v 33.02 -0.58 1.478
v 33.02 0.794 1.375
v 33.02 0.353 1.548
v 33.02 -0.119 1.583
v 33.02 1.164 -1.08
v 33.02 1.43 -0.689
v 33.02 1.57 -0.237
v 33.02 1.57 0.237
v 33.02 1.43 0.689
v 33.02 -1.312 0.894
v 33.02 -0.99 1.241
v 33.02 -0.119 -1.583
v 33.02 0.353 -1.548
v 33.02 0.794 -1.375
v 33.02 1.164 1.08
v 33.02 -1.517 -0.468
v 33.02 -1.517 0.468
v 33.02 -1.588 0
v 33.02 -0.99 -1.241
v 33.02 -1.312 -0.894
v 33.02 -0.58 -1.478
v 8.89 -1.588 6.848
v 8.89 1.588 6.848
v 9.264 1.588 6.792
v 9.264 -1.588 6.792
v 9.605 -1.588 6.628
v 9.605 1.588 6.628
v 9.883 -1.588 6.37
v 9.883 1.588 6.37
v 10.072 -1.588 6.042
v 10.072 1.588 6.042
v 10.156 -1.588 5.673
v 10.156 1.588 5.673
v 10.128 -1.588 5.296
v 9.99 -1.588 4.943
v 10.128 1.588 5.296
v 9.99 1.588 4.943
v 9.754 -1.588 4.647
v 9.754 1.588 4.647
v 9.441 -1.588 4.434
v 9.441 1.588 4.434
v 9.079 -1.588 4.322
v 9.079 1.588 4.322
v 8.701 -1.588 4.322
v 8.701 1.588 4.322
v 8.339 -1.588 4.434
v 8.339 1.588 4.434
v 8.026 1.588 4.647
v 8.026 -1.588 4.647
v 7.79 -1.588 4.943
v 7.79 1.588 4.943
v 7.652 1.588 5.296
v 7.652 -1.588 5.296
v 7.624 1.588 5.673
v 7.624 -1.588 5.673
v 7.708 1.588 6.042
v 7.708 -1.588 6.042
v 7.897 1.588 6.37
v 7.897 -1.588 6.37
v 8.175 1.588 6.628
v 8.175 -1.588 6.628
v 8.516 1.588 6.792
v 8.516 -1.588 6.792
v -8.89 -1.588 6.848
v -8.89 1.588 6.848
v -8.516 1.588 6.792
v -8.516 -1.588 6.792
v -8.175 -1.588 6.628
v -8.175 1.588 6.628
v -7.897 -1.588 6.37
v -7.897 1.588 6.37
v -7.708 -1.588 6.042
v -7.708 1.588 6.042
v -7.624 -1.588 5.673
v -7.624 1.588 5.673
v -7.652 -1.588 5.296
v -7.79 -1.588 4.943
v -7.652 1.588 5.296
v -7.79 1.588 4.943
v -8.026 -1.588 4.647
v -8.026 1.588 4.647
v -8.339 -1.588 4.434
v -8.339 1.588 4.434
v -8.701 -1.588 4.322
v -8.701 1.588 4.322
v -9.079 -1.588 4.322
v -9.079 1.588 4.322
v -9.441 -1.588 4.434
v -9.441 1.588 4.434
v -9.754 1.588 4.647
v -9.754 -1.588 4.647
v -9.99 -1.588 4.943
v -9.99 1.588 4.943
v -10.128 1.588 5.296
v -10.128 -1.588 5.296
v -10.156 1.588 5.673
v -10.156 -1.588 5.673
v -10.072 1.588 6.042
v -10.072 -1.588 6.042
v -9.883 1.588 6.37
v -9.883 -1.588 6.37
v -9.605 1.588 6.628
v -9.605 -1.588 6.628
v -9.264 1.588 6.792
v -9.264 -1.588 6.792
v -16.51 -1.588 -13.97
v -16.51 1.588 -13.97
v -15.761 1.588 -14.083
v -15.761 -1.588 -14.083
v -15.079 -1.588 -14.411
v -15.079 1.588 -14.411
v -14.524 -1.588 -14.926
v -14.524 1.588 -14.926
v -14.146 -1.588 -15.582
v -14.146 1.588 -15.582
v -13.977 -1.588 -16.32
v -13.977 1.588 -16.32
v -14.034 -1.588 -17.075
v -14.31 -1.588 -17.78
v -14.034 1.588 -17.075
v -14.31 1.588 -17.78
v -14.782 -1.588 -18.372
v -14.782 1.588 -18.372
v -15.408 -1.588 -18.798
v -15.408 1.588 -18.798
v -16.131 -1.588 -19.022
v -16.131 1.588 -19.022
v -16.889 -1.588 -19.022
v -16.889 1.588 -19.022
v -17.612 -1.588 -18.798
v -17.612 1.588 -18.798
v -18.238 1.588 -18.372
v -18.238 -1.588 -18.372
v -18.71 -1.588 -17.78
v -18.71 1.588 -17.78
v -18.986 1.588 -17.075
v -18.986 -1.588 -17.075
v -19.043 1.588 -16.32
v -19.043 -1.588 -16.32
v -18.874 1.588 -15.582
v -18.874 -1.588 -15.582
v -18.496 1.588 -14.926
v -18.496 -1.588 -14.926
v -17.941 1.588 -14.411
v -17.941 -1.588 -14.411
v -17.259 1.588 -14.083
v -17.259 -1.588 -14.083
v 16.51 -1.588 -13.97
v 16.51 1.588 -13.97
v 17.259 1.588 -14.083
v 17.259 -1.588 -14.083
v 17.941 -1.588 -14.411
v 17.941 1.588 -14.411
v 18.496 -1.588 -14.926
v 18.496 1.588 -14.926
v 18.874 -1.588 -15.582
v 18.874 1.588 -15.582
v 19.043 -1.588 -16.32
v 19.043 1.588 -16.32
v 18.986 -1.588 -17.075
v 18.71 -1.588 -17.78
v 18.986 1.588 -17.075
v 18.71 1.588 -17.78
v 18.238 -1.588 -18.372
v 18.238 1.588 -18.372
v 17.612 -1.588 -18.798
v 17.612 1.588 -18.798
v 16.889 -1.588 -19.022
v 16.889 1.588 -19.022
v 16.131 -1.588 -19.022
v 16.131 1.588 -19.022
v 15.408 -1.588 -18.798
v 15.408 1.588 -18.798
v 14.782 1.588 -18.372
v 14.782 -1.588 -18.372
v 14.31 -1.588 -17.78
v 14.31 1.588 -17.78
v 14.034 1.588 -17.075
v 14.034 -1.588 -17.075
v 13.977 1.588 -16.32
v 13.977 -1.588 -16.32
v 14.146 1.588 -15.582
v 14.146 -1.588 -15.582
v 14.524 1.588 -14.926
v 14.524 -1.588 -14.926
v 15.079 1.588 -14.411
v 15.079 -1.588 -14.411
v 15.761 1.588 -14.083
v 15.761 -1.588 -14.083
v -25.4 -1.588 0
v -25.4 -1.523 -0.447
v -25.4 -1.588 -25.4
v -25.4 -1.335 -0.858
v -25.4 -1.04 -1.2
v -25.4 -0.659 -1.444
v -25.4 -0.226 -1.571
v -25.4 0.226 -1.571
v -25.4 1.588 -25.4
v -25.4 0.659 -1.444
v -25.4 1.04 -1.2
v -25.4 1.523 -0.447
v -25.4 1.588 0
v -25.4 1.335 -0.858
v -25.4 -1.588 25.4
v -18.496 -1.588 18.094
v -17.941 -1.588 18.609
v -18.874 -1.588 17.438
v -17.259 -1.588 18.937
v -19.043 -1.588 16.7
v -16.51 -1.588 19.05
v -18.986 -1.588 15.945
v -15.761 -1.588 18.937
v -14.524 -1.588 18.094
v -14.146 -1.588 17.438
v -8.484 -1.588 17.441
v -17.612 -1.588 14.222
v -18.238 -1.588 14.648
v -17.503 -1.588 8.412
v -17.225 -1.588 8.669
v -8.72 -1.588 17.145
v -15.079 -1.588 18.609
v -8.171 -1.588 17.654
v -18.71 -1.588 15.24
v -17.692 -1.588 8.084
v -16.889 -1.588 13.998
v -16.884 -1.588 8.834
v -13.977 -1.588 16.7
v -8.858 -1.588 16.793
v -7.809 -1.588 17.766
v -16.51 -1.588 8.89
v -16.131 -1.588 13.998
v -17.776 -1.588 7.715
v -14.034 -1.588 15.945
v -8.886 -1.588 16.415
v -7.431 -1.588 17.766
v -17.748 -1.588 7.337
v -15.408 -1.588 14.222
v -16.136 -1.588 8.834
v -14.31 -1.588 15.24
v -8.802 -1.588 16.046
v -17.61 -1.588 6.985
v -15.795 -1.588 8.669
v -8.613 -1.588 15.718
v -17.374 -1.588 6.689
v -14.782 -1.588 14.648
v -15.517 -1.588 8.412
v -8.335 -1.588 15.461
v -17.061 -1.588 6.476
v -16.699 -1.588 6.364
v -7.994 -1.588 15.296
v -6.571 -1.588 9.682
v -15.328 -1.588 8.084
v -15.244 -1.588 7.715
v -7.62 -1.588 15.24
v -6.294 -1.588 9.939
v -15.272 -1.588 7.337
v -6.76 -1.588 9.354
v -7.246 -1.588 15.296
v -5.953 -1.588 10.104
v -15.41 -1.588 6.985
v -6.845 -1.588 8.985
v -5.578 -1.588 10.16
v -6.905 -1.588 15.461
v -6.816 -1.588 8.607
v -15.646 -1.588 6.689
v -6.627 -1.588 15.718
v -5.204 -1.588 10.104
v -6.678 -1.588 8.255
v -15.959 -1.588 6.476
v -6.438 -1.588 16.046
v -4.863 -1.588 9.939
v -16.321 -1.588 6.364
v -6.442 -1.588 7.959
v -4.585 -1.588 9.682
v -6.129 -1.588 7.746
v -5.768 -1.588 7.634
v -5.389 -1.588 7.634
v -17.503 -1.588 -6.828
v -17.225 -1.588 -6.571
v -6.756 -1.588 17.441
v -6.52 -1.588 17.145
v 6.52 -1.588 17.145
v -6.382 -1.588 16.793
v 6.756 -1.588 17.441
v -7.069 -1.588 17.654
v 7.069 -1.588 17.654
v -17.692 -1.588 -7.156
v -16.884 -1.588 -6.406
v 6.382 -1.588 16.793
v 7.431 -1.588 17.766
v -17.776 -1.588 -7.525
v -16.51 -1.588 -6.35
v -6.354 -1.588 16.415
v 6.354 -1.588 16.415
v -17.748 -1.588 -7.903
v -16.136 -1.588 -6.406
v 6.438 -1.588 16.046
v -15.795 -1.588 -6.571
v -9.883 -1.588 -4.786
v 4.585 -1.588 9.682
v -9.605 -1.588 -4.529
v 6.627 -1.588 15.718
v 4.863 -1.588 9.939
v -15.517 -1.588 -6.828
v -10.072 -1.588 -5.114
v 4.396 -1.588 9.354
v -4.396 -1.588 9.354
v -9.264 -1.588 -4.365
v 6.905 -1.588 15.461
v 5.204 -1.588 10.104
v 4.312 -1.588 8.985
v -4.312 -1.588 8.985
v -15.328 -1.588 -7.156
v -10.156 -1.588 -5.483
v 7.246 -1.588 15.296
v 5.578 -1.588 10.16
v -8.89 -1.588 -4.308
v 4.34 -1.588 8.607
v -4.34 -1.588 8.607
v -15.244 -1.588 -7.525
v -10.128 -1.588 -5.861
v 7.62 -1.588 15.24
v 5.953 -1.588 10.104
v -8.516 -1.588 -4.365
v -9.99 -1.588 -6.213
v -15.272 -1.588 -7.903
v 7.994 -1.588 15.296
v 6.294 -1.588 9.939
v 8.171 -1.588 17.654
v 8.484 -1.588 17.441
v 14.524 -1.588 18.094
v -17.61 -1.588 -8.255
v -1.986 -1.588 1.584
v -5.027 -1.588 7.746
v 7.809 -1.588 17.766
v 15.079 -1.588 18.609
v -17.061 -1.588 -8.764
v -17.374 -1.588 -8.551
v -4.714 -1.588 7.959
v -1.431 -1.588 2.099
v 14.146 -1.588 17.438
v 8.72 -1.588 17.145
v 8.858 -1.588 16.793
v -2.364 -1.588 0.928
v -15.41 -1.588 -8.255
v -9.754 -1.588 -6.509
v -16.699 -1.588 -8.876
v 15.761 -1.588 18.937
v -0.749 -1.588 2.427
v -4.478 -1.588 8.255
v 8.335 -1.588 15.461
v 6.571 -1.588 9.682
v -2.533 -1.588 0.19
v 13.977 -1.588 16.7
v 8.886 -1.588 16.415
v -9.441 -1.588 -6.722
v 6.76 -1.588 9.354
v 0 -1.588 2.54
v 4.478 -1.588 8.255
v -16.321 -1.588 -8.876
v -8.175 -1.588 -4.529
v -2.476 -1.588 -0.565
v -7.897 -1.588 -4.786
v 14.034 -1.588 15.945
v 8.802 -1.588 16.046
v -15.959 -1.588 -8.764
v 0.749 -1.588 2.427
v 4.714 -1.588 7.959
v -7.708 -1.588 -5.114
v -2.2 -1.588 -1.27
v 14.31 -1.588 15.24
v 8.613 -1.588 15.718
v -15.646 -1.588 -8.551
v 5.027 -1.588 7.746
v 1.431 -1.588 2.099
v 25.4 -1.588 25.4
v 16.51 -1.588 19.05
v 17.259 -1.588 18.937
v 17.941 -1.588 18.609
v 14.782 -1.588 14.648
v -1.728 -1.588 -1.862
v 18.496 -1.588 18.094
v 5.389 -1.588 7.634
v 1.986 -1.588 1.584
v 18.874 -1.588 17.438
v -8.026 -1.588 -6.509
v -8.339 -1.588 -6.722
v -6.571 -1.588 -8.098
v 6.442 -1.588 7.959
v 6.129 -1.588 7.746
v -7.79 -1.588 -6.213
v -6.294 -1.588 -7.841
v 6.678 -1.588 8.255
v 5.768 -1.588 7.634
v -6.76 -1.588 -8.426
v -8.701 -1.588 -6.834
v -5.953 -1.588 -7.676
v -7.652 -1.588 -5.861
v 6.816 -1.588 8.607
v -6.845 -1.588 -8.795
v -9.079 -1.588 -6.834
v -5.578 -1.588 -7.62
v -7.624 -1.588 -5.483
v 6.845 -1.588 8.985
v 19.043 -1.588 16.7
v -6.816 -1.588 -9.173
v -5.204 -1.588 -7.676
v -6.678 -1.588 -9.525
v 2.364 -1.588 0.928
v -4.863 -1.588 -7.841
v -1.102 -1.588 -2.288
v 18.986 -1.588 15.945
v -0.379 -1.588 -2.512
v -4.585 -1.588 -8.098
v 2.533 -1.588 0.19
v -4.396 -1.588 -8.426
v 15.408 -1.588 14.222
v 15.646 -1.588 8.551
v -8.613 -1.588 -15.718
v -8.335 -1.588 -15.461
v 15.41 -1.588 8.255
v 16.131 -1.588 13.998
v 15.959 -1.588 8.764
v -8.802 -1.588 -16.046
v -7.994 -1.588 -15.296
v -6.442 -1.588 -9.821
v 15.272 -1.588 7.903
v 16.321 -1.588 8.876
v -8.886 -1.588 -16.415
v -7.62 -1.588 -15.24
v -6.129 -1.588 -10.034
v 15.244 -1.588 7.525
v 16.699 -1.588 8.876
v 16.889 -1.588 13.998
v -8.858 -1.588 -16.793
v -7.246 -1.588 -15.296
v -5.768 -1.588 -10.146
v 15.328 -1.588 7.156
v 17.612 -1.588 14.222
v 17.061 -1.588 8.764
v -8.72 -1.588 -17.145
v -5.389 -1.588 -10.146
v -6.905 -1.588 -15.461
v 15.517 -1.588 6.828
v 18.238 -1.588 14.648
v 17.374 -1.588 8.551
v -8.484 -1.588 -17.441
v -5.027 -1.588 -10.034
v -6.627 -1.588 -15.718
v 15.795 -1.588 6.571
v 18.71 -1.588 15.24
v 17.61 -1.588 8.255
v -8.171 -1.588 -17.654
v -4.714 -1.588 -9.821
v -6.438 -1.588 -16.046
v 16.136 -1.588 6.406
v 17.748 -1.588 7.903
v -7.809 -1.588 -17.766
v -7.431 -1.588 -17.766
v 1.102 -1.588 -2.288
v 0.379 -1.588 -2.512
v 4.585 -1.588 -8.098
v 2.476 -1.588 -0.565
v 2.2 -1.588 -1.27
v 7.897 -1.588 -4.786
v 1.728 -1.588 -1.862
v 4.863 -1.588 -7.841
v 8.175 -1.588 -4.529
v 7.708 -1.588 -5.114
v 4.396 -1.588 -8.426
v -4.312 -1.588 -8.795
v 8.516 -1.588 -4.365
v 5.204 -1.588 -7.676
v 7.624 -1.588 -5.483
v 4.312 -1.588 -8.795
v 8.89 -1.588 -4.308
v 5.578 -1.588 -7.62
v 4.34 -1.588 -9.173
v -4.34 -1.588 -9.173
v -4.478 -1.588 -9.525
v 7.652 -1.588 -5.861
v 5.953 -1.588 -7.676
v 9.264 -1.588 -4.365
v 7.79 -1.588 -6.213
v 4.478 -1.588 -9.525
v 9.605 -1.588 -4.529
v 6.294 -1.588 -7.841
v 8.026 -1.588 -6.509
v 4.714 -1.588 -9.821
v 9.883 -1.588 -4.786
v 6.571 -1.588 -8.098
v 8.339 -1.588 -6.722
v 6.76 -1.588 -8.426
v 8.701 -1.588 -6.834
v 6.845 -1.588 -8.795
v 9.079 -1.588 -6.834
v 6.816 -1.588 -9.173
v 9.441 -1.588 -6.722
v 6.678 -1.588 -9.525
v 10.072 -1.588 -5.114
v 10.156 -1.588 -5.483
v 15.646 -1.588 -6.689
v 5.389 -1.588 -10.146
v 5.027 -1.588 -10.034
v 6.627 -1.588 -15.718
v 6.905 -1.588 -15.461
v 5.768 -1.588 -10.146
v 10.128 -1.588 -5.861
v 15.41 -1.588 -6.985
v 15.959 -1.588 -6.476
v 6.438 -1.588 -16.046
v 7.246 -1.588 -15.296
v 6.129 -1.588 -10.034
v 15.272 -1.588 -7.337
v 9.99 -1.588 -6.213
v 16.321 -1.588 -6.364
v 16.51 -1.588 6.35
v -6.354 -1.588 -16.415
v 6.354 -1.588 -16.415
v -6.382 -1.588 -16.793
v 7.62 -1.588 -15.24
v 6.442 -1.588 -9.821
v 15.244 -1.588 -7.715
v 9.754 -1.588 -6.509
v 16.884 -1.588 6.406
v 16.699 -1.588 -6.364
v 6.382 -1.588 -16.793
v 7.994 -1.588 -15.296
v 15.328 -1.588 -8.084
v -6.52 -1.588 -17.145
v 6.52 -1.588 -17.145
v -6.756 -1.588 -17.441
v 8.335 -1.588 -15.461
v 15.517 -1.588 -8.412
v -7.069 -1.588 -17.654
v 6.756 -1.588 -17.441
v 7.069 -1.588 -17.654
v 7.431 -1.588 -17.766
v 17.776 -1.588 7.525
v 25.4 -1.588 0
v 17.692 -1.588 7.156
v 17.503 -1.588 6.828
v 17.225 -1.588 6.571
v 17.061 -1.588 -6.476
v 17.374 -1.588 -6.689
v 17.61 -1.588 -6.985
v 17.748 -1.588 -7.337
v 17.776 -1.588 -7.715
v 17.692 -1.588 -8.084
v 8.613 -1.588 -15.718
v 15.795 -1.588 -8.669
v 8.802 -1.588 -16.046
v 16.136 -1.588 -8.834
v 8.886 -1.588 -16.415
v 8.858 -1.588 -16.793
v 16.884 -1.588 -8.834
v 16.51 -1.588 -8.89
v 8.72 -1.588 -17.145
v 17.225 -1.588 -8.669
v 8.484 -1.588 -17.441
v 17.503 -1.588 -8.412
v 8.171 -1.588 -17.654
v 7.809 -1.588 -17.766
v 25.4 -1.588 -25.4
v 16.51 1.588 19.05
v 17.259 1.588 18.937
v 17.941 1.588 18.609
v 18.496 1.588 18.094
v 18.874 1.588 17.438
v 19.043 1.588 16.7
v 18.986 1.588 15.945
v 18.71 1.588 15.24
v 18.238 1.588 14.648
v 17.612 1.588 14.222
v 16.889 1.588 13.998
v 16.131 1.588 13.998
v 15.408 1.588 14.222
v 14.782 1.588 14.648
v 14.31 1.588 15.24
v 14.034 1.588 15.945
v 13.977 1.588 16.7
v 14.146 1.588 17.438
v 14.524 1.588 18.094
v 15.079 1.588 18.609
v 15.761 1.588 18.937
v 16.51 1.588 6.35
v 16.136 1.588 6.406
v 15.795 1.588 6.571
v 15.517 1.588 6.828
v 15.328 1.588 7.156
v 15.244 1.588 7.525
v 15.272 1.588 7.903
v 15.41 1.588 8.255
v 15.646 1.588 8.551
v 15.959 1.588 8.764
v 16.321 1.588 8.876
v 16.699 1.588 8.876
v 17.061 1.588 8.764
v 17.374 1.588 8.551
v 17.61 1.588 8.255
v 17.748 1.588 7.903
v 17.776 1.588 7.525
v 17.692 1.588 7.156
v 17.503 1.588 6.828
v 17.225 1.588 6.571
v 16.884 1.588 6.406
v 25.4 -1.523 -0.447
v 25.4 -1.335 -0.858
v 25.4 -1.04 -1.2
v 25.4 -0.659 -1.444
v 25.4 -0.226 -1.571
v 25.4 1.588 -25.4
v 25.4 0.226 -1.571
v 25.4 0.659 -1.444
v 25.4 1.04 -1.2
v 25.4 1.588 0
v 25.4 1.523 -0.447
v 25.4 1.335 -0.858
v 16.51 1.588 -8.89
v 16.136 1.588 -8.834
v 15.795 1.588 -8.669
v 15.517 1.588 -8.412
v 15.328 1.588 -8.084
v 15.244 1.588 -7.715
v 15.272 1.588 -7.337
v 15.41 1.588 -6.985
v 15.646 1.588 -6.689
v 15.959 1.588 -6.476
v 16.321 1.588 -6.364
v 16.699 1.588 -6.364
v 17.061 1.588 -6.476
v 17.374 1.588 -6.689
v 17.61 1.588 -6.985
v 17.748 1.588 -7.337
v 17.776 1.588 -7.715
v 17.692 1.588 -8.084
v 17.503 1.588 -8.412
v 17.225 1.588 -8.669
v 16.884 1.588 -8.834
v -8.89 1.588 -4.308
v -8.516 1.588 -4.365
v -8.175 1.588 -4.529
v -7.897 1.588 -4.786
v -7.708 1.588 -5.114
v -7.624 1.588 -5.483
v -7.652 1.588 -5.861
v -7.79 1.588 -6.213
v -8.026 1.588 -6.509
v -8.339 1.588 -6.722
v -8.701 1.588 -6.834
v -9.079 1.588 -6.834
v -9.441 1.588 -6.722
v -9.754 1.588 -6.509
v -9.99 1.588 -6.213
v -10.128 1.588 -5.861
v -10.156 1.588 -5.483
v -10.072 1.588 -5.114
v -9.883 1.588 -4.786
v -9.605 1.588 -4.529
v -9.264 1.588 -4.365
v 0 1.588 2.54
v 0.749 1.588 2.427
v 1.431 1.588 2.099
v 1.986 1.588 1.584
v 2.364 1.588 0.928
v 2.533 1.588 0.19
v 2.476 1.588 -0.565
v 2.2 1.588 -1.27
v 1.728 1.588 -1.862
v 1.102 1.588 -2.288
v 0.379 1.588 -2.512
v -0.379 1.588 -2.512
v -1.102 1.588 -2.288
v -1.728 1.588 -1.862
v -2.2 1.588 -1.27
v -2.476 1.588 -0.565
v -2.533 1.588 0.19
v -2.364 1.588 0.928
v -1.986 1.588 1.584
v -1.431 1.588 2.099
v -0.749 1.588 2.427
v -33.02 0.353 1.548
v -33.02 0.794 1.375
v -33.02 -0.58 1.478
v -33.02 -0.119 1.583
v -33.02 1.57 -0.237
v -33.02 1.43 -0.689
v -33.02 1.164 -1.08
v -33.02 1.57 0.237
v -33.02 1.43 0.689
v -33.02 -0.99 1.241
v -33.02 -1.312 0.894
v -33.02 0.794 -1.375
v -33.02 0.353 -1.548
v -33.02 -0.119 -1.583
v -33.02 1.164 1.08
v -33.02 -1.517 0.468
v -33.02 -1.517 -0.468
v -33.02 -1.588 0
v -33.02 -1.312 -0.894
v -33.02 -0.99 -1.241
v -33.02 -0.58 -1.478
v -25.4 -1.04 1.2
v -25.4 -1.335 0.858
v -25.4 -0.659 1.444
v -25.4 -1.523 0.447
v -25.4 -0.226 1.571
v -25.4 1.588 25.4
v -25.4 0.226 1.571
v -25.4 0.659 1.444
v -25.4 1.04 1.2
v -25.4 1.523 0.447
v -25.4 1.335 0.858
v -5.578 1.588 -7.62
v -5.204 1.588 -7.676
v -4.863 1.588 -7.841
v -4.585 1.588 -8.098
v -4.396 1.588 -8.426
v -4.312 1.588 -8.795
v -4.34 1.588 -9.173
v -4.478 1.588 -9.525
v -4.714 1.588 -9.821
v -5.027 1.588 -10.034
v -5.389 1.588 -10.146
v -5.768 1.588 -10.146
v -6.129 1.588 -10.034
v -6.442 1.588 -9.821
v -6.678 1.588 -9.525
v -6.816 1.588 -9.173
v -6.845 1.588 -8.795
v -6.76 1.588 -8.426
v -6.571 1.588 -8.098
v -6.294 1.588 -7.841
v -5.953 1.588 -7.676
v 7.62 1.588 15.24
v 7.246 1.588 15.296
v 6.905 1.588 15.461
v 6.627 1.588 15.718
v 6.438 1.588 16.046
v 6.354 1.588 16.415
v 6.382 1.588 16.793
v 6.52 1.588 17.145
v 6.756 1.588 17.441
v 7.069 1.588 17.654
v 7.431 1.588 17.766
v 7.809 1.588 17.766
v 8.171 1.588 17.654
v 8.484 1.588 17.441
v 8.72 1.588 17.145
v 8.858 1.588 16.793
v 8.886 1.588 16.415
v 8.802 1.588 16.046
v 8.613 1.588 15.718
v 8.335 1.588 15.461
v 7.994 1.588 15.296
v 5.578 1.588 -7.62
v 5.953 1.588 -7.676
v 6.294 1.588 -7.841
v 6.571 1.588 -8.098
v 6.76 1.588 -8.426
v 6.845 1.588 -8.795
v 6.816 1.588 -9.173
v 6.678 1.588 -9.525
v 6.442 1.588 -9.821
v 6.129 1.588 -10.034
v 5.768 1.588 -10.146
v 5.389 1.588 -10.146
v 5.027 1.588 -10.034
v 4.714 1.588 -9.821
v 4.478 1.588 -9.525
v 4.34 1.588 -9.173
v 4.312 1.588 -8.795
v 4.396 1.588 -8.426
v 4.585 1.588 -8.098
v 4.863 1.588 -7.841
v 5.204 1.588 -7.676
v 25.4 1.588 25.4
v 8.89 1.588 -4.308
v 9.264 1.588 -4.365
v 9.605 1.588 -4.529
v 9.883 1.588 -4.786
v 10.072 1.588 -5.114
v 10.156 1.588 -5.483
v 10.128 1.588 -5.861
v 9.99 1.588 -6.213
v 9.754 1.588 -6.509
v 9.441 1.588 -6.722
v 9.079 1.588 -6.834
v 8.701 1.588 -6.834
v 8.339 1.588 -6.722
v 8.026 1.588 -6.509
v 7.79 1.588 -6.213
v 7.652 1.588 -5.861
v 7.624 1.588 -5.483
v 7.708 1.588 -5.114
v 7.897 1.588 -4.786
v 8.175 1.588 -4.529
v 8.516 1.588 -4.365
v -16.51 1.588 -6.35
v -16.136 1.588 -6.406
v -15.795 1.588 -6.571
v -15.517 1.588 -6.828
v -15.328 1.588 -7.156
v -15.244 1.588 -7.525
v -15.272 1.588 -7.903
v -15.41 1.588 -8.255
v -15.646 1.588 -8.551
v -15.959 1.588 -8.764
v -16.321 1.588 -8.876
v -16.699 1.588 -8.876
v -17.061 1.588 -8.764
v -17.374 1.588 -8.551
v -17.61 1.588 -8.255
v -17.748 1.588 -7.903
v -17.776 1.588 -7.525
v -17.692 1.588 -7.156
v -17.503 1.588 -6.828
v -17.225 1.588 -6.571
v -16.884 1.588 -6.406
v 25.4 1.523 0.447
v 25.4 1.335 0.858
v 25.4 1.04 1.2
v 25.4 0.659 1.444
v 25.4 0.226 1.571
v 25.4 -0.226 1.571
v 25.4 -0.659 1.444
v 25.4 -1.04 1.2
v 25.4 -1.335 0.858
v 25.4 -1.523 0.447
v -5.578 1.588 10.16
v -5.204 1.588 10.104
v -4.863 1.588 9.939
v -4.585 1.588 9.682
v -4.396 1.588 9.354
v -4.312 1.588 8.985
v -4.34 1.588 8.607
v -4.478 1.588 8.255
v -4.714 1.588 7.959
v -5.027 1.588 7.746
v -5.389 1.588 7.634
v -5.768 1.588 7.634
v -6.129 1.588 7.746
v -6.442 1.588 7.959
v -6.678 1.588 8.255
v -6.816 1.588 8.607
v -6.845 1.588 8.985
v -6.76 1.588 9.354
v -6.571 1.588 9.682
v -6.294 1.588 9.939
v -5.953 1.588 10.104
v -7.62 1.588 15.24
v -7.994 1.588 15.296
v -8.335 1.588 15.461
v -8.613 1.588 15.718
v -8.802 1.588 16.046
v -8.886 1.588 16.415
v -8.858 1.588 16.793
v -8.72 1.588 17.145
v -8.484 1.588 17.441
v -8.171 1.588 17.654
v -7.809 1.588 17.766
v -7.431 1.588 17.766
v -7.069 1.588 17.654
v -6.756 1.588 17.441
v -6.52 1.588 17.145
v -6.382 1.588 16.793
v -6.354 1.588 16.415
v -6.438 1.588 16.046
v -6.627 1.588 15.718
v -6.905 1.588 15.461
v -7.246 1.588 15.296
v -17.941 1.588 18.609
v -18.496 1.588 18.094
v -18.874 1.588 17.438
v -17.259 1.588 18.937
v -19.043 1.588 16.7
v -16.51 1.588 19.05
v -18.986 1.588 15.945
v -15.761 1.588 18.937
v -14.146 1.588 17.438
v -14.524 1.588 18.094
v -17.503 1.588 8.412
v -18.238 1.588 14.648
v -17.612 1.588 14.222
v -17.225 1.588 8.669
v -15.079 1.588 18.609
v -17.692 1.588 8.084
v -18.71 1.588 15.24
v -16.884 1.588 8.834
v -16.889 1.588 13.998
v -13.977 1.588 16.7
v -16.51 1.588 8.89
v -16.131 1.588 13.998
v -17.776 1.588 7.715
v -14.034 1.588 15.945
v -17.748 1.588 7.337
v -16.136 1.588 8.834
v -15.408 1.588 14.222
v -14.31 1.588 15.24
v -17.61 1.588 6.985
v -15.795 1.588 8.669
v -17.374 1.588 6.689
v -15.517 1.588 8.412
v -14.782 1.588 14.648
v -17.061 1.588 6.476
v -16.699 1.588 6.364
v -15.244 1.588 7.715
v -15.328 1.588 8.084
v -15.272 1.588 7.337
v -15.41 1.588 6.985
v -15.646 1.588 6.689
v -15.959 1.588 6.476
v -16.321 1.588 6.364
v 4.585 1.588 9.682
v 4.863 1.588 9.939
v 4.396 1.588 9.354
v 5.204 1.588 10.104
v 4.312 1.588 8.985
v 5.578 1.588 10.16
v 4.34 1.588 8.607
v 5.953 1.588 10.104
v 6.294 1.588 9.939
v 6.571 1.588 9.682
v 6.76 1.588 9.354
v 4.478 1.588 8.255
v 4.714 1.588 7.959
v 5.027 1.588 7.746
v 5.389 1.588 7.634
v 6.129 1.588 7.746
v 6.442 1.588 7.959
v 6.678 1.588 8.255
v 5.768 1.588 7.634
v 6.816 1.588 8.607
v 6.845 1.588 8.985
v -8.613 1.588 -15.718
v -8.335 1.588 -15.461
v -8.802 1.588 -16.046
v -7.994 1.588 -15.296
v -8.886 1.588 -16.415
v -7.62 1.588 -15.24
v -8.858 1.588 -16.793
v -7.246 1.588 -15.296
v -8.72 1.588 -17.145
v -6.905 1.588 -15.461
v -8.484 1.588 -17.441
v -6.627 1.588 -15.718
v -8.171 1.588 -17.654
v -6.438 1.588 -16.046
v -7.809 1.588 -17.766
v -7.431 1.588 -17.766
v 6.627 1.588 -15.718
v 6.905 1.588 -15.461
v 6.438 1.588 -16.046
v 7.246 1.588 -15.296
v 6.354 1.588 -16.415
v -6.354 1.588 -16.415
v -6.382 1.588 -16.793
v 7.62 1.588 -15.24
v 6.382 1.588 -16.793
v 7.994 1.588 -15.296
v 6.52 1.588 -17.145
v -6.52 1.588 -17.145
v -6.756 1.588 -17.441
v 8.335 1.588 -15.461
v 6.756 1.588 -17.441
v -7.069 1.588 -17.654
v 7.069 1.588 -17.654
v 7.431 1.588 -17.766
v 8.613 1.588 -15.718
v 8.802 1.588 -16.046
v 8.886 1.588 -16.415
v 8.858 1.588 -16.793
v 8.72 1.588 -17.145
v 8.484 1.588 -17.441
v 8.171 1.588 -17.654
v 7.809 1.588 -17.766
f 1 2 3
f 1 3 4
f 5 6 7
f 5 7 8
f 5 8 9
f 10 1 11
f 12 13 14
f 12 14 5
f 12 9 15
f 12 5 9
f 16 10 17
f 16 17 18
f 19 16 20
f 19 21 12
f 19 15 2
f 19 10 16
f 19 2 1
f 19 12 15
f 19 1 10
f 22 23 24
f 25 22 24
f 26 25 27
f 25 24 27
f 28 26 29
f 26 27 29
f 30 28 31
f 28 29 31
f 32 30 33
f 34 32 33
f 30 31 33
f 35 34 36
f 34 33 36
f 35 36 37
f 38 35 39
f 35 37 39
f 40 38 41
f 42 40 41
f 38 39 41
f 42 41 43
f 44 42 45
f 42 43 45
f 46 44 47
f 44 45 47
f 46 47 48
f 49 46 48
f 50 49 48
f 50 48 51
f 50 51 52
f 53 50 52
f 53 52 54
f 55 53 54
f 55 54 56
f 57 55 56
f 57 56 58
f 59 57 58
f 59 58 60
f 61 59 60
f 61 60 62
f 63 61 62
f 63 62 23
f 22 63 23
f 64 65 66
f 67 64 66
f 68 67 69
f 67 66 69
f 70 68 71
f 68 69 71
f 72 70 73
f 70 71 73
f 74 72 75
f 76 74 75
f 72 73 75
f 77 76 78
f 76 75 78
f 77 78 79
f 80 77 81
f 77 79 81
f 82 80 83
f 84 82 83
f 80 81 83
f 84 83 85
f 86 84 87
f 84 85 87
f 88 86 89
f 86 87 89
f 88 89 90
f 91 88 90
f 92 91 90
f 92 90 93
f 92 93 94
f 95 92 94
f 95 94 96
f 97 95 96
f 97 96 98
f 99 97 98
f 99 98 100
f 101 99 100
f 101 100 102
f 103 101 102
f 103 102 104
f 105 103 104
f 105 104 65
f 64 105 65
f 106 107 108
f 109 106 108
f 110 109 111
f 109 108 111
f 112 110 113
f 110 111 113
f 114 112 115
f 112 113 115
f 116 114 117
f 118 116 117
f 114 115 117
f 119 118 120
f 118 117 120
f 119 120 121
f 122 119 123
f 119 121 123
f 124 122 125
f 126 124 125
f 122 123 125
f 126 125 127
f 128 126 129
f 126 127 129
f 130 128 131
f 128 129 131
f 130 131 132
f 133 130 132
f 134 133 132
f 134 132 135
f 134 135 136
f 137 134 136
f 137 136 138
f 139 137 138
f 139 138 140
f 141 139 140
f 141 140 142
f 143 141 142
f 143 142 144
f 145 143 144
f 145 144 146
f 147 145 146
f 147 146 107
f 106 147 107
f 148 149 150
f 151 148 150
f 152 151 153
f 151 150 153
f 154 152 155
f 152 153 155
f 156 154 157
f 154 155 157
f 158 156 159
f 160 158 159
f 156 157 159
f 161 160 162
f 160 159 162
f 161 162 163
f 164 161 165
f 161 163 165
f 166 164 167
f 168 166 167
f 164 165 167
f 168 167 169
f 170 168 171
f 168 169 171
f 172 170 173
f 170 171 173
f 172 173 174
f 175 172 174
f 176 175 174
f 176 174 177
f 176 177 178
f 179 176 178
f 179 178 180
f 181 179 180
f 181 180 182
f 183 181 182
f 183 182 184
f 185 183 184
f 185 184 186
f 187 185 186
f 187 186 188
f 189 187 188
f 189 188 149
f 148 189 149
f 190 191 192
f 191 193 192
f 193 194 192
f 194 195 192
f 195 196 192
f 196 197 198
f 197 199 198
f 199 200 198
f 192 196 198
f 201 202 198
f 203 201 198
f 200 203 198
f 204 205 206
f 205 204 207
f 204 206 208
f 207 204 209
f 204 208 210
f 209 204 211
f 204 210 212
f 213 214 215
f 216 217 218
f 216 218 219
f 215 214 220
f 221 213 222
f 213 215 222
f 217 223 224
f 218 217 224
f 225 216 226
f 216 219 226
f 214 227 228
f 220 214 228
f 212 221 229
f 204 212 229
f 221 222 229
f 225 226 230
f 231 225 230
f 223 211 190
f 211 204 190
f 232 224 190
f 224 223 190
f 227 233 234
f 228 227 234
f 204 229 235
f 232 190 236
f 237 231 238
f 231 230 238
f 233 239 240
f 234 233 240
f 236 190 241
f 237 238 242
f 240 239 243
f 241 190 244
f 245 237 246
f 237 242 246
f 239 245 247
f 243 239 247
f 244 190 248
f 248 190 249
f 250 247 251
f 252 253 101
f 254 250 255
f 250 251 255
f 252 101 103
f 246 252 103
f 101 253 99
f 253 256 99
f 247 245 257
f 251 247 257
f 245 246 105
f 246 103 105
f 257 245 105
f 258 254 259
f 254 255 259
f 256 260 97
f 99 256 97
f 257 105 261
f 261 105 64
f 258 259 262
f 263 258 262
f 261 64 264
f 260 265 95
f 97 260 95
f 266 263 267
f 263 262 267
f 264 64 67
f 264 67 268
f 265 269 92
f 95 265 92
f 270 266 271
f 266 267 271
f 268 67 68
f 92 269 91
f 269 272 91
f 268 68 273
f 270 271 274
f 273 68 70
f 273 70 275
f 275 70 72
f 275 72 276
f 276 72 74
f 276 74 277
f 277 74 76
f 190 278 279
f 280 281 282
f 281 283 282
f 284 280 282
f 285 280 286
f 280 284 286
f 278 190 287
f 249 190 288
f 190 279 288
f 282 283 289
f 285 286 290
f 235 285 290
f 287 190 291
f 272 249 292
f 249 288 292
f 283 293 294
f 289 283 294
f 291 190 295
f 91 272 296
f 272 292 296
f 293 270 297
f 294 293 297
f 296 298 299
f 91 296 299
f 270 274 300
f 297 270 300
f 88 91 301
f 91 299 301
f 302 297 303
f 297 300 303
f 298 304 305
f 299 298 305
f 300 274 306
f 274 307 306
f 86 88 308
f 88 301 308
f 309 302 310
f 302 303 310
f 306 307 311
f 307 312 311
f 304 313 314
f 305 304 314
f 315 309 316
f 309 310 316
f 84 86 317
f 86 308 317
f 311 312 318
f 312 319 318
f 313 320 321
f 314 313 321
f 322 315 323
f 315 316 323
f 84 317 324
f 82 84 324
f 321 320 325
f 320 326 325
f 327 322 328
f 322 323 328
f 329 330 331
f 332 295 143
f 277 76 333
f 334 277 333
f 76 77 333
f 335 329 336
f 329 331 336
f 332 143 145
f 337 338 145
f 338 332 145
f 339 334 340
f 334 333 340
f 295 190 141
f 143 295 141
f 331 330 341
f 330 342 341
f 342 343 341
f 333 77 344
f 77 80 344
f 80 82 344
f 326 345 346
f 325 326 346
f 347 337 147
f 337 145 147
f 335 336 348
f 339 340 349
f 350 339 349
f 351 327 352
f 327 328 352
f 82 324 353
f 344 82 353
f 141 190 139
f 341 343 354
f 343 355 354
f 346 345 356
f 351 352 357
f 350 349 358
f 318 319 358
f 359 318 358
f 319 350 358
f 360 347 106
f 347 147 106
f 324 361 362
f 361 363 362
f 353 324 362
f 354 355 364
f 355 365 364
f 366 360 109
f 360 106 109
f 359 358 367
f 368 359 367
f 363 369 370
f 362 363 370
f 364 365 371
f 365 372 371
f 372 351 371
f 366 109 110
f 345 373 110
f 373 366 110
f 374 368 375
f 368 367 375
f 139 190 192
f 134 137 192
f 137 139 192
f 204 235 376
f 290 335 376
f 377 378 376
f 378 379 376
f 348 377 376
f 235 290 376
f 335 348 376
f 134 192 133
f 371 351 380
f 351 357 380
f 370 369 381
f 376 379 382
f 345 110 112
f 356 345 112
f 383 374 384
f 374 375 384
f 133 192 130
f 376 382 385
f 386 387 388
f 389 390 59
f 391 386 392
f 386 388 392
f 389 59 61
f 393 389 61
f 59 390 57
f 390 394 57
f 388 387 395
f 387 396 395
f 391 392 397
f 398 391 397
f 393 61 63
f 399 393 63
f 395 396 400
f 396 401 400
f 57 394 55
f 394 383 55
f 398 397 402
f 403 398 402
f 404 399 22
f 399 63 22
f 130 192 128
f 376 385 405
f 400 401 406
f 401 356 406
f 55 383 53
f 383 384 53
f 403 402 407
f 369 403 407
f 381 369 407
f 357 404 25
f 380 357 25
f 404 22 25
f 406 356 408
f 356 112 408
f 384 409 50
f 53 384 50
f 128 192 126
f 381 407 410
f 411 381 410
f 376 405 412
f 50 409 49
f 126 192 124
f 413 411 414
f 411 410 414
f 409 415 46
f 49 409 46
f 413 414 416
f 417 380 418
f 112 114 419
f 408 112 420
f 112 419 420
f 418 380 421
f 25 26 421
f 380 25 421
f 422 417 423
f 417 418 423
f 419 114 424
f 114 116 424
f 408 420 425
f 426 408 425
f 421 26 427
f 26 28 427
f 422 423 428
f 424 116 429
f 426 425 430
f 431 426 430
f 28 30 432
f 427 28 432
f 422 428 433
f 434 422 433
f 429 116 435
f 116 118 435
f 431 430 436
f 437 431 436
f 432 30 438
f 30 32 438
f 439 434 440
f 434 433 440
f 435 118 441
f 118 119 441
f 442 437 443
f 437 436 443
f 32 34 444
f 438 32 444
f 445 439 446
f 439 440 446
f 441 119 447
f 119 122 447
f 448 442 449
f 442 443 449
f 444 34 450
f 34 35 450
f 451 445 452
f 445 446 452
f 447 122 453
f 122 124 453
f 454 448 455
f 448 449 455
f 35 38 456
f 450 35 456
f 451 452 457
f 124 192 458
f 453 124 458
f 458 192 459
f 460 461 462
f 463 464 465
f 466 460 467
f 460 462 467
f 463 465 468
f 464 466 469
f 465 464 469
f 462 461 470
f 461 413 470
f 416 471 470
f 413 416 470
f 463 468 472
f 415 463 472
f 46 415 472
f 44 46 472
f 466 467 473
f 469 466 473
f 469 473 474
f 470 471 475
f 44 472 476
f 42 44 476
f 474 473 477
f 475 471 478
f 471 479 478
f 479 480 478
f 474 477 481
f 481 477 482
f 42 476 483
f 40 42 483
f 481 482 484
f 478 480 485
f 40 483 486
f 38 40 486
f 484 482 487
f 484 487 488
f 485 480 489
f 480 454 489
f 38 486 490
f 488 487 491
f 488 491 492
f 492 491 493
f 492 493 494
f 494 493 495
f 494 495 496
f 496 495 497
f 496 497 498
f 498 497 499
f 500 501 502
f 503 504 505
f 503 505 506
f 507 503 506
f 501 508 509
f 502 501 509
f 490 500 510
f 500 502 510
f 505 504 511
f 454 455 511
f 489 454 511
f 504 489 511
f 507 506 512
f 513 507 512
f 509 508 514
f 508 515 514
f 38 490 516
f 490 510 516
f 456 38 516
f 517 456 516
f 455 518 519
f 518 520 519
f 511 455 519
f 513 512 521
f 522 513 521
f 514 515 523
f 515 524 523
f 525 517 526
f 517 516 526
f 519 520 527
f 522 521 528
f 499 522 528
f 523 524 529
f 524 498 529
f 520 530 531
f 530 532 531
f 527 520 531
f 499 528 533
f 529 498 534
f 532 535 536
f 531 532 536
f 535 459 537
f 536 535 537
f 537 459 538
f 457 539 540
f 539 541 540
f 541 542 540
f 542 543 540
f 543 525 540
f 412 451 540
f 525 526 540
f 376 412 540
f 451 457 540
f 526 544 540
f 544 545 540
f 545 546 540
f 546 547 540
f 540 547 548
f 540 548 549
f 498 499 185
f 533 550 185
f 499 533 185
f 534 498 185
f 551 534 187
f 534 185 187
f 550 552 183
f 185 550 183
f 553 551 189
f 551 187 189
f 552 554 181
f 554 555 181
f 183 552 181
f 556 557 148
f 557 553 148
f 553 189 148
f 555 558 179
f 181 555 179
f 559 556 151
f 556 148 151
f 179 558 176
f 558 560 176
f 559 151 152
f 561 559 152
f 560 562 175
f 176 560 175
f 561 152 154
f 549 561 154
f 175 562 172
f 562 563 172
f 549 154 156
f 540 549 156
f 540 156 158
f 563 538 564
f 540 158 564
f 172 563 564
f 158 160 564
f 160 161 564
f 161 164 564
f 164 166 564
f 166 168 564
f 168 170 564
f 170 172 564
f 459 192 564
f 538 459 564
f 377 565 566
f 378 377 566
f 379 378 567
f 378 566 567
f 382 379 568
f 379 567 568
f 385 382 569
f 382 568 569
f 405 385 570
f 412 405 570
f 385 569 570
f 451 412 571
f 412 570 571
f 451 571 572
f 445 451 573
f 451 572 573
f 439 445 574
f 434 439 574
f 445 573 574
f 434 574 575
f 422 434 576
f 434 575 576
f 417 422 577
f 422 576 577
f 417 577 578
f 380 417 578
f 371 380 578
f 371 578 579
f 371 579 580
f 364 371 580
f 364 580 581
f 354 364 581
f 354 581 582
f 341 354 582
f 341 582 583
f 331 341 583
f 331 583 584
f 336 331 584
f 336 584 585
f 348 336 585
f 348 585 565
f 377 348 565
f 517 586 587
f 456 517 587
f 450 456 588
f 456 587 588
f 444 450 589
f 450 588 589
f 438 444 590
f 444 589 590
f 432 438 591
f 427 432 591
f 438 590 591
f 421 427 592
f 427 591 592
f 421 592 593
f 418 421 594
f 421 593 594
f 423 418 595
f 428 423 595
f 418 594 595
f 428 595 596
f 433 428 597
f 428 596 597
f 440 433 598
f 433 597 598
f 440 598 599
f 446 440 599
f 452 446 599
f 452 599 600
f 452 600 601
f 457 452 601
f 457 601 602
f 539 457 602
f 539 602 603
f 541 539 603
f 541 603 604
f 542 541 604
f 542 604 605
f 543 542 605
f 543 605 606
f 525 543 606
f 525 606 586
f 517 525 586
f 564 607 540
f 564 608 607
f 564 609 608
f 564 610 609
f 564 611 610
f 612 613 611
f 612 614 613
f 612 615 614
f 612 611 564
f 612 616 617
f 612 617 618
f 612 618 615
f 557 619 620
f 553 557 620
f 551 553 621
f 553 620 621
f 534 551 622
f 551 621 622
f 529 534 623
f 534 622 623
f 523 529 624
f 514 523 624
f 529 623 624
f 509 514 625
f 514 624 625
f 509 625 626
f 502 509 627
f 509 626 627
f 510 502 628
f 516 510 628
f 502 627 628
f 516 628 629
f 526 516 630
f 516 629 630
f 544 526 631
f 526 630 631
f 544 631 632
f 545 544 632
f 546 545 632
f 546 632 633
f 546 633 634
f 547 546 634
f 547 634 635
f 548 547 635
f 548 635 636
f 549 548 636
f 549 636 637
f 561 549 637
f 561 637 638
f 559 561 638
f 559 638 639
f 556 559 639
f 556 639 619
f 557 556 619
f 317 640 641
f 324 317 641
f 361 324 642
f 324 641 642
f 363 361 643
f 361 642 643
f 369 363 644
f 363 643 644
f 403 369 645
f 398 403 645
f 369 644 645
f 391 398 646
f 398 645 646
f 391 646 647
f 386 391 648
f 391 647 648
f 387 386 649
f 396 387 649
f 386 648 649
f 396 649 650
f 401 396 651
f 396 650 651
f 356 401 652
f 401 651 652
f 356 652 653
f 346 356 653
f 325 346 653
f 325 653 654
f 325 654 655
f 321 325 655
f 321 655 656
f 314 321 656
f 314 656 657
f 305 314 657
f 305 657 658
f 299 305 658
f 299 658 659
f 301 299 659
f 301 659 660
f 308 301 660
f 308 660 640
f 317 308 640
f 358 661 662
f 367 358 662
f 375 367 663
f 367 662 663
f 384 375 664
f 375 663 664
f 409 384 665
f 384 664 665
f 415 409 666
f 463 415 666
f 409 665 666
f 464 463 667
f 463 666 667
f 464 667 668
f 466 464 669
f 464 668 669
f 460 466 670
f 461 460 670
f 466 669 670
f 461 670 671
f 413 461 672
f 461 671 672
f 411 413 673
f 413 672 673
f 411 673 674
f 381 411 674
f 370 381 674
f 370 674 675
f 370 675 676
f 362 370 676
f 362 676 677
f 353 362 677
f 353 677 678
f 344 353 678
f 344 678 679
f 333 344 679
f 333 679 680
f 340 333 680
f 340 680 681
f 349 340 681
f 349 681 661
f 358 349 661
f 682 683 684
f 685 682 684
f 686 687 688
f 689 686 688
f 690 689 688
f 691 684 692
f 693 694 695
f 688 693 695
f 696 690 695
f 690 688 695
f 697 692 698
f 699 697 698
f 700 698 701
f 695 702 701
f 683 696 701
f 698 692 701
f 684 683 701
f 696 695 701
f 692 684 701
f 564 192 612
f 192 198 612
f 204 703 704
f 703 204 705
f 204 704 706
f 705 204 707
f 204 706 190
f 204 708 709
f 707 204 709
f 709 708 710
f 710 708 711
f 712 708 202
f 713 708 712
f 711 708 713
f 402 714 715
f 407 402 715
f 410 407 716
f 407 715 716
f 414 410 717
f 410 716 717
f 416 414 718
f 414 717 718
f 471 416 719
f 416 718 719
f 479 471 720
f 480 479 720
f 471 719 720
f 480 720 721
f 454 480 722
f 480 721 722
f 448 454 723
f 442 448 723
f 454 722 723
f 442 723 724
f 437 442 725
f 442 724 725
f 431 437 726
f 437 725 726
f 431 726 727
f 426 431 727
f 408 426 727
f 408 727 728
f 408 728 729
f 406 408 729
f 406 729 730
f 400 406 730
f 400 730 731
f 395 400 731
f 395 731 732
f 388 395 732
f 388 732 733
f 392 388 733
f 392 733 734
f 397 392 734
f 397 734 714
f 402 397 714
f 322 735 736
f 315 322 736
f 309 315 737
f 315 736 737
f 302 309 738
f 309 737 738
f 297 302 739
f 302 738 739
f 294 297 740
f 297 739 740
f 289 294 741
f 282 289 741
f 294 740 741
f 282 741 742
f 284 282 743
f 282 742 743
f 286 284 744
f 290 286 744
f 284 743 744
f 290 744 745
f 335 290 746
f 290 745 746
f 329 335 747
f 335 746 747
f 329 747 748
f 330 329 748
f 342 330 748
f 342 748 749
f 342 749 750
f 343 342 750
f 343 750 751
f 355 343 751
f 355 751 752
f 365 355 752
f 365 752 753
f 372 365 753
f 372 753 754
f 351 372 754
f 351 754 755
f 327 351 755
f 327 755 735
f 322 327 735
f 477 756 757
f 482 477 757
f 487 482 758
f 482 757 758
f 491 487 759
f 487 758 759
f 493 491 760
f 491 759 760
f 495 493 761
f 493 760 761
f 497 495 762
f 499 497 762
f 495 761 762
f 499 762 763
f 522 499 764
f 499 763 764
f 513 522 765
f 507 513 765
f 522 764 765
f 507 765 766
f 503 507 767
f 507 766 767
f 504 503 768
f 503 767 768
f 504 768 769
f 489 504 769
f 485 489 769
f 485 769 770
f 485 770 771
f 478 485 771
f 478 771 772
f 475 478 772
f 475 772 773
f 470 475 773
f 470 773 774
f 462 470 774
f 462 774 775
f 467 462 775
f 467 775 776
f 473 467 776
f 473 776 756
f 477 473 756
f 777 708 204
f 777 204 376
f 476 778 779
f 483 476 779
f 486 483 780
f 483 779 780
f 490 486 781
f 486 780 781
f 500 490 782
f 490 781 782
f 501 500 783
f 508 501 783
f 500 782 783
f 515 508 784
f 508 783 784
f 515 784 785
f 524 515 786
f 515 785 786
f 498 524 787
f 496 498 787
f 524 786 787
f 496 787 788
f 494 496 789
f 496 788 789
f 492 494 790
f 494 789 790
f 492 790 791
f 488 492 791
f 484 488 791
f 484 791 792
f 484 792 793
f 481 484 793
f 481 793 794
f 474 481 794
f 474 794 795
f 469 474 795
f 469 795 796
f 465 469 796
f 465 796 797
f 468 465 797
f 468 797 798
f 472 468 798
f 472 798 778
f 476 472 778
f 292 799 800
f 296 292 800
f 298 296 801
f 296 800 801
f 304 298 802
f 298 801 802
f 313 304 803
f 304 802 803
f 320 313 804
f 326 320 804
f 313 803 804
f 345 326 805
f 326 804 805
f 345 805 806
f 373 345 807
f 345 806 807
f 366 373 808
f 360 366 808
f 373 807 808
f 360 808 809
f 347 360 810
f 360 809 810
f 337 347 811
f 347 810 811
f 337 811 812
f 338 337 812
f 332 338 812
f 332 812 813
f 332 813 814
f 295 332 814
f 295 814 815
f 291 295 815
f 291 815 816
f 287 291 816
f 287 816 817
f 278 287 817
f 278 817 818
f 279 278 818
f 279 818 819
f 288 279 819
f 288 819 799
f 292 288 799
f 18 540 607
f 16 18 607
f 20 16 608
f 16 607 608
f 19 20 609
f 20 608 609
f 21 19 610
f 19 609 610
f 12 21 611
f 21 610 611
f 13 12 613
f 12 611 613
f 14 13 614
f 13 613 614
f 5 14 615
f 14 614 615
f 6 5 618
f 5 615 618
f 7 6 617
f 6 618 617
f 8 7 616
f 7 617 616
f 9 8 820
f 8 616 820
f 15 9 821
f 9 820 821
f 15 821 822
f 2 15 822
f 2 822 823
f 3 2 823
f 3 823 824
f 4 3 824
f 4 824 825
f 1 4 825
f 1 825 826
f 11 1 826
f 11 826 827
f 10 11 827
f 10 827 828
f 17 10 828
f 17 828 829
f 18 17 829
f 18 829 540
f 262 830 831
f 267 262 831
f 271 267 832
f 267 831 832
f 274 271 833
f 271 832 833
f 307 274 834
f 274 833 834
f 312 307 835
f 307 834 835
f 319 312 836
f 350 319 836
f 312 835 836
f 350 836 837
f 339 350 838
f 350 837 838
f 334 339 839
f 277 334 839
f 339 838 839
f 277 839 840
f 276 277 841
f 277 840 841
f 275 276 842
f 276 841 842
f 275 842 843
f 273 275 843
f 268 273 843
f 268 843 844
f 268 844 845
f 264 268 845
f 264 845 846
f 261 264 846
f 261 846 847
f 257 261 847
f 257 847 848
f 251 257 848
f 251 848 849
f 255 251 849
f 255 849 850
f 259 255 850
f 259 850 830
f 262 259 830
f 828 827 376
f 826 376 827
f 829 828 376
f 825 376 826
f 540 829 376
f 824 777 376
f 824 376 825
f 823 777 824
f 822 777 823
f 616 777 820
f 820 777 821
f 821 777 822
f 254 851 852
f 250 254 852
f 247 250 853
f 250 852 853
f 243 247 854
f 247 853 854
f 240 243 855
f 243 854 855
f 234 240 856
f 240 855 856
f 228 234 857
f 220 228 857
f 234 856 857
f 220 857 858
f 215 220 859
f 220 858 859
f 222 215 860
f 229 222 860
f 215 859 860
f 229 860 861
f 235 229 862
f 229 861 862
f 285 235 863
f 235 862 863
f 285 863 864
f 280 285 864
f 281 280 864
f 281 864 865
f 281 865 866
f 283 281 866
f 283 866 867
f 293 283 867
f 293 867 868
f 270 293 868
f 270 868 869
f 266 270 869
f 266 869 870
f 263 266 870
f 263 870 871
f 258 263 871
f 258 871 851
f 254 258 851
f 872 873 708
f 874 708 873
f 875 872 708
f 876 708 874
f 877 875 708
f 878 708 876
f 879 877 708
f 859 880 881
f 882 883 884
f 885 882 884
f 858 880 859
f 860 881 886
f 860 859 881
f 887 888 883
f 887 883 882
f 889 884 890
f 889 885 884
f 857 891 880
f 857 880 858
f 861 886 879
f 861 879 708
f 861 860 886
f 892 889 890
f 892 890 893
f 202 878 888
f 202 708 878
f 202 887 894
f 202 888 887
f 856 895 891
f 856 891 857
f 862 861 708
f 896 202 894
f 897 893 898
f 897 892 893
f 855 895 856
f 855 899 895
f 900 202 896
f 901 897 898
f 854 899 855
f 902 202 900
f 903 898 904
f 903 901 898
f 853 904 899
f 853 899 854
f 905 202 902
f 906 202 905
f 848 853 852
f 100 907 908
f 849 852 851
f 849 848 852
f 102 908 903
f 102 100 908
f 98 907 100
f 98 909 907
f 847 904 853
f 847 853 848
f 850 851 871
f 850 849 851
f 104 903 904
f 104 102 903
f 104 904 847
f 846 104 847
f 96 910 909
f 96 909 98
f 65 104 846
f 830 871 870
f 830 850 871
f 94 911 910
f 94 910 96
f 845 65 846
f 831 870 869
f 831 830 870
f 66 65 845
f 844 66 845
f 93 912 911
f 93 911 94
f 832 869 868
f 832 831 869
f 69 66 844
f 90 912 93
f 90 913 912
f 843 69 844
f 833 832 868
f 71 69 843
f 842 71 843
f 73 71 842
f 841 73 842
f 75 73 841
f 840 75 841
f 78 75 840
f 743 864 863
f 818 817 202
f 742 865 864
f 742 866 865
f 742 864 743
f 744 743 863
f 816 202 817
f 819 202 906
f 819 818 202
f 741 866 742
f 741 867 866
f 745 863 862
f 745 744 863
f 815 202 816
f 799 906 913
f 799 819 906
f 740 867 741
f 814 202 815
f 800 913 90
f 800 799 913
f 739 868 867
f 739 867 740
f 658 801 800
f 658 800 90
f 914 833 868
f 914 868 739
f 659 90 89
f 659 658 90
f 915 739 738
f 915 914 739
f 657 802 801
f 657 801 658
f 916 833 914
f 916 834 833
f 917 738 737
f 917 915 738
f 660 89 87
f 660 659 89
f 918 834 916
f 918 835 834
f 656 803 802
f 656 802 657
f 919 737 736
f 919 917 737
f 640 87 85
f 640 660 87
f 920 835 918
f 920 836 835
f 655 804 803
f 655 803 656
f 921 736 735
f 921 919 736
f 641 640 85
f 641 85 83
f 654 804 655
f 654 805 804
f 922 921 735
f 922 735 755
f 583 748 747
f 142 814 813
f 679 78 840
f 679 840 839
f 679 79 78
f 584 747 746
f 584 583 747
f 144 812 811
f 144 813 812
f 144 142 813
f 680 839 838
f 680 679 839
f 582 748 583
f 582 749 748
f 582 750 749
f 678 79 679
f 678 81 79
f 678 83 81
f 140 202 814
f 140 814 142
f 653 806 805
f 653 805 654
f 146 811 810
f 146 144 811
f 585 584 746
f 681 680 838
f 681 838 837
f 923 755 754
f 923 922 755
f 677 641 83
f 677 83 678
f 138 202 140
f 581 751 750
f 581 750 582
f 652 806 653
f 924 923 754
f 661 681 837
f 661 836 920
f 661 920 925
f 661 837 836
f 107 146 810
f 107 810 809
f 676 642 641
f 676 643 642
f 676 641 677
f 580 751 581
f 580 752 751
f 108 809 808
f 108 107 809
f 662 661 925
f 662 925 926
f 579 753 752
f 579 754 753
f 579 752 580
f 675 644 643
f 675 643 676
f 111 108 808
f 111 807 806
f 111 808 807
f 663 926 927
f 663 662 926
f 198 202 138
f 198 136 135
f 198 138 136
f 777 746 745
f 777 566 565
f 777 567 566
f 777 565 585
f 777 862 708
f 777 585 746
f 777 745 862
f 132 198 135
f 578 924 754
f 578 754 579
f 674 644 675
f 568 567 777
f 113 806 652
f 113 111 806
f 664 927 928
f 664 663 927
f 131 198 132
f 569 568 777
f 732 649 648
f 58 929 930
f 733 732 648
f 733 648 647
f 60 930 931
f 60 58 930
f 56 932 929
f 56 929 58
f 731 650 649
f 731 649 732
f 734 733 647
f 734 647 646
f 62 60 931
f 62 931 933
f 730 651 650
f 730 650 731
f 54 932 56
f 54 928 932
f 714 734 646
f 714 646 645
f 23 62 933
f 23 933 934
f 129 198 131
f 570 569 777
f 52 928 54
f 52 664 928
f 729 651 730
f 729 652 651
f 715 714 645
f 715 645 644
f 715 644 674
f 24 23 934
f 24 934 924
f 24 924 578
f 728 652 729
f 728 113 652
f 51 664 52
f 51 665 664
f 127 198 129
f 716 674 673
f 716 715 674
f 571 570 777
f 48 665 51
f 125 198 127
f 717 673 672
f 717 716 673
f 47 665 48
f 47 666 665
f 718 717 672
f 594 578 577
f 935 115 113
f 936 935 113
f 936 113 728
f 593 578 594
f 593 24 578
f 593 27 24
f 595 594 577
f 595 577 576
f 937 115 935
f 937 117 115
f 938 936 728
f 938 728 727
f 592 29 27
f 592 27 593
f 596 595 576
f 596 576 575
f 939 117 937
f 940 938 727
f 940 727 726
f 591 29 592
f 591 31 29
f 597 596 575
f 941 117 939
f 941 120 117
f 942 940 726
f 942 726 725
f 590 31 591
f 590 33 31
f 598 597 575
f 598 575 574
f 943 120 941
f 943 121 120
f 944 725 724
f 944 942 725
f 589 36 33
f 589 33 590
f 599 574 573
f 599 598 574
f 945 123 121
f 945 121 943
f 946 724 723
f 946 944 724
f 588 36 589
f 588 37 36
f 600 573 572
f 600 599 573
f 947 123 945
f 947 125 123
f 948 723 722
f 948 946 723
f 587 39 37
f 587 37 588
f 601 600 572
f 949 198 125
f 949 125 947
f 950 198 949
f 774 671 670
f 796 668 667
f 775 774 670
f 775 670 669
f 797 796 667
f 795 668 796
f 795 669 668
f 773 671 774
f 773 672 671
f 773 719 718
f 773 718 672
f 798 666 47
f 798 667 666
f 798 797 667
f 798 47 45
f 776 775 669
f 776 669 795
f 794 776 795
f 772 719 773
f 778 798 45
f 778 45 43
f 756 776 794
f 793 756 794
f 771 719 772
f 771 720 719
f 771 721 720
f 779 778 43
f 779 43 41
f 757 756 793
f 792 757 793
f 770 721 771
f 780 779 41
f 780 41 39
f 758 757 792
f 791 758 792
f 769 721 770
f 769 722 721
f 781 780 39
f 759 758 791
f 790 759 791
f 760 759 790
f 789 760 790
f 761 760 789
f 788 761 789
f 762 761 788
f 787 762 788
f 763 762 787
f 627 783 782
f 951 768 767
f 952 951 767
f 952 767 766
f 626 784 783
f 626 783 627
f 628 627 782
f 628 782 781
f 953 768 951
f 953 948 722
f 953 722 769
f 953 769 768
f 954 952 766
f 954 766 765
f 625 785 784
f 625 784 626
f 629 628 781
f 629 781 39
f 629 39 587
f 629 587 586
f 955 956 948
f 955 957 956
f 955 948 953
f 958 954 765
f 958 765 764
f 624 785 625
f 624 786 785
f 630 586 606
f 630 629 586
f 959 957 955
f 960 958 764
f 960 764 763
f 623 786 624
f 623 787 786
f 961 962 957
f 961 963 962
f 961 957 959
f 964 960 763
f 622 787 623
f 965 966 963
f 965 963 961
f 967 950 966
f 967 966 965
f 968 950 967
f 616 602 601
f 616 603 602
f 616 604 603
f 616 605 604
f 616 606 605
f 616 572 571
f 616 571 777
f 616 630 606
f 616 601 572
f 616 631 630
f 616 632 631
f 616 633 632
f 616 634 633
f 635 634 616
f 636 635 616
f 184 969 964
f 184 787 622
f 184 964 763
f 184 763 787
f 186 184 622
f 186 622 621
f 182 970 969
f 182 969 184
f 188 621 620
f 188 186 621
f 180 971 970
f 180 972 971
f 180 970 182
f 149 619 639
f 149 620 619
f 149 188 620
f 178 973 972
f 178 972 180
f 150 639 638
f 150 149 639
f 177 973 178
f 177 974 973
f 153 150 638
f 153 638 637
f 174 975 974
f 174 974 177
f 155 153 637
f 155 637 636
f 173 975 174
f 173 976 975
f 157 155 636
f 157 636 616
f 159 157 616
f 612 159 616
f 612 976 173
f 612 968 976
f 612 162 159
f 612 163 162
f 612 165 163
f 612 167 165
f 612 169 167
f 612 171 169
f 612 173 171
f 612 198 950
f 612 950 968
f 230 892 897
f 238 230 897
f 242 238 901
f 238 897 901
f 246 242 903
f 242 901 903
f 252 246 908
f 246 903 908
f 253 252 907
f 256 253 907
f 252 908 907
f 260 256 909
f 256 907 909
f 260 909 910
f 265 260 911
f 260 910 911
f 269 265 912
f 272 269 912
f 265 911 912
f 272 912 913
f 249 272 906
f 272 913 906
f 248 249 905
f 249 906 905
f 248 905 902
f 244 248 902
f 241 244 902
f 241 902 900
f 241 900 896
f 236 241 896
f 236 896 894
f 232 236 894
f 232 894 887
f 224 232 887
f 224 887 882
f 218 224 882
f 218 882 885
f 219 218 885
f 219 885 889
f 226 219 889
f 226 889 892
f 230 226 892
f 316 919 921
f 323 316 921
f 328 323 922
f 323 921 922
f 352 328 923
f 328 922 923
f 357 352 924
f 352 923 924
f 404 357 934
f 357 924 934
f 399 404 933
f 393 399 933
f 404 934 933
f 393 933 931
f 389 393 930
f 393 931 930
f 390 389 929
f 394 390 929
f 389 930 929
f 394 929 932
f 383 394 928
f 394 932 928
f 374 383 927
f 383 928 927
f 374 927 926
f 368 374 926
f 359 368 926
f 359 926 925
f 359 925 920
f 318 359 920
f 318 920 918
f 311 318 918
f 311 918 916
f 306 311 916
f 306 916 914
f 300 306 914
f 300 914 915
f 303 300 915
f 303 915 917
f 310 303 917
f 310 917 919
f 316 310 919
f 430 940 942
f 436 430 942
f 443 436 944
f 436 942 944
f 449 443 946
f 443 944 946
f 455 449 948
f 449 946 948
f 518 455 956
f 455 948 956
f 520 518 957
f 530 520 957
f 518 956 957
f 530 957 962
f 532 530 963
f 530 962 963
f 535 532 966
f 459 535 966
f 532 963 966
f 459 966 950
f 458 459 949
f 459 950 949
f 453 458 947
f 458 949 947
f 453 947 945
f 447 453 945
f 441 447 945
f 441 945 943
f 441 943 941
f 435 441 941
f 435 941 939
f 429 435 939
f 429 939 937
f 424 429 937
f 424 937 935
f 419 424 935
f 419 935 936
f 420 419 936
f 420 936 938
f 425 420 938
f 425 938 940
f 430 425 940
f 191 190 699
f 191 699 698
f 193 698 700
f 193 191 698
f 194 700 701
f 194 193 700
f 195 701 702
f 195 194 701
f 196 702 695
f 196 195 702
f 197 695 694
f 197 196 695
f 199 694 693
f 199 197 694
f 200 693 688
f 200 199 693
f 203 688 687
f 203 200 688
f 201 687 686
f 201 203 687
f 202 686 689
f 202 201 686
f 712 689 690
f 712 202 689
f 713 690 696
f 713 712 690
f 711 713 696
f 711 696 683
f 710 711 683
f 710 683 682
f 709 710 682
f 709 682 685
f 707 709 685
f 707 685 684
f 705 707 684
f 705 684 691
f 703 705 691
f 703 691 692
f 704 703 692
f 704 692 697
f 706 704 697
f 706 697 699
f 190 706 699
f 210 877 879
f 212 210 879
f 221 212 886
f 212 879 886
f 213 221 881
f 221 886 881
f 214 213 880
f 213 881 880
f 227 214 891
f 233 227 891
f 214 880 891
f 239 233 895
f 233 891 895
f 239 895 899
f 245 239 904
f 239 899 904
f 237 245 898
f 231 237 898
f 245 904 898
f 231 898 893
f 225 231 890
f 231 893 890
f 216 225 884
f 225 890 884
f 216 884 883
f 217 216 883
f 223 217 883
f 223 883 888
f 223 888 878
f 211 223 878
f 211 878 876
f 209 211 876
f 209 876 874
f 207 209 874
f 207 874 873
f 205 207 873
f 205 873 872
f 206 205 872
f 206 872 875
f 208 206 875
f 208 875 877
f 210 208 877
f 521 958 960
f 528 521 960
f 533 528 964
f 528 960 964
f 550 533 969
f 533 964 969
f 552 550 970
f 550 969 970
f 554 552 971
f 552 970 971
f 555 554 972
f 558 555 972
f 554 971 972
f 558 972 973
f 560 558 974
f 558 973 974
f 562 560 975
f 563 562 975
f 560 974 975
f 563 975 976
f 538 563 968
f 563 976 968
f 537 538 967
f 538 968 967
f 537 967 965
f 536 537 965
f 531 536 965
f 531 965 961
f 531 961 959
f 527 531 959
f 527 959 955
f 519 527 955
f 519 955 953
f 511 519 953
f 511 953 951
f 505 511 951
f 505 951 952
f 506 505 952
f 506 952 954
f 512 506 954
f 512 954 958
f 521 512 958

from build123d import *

# Parameters (mm, degrees)
SKETCH1_W           = 50.8
SKETCH1_H           = 50.8
BOSS_EXTRUDE1_DEPTH = 1.5875
SKETCH3_R           = 1.5875
BOSS_EXTRUDE2_DEPTH = 7.62
SKETCH4_R           = 2.54
SKETCH4_R_2         = 1.27
CUT_EXTRUDE1_DEPTH  = 42.77991174


with BuildPart() as part:
    # Sketch1 → Boss-Extrude1 (new, symmetric)
    with BuildSketch(Plane(origin=(0, 0, 0), x_dir=(1, 0, 0), z_dir=(0, 1, 0))):
        Rectangle(SKETCH1_W, SKETCH1_H)
    extrude(amount=BOSS_EXTRUDE1_DEPTH, both=True)

    # Sketch3 → Boss-Extrude2 (add)
    with BuildSketch(Plane(origin=(25.4, 0, 0), x_dir=(0, 0, -1), z_dir=(1, 0, 0))):
        with Locations(Location((0, 0, 0), (0, 0, 270))):
            Circle(SKETCH3_R)
    boss_extrude2 = extrude(amount=BOSS_EXTRUDE2_DEPTH)

    # Mirror1: Boss-Extrude2 across plane
    add(boss_extrude2.mirror(Plane(origin=(0, 0, 0), x_dir=(0, 0, 1), z_dir=(1, 0, 0))))

    # Sketch4 → Cut-Extrude1 (cut, through all)
    with BuildSketch(Plane(origin=(0, 1.5875, 0), x_dir=(1, 0, 0), z_dir=(0, 1, 0))):
        with Locations(Location((0, 0, 0), (0, 0, 270))):
            Circle(SKETCH4_R)
        with Locations(Location((-16.51, 16.51, 0), (0, 0, 270))):
            Circle(SKETCH4_R)
        with Locations(Location((16.51, 16.51, 0), (0, 0, 270))):
            Circle(SKETCH4_R)
        with Locations(Location((16.51, -16.51, 0), (0, 0, 270))):
            Circle(SKETCH4_R)
        with Locations(Location((-16.51, -16.51, 0), (0, 0, 270))):
            Circle(SKETCH4_R)
        with Locations(Location((-16.51, 7.62, 0), (0, 0, 270))):
            Circle(SKETCH4_R_2)
        with Locations(Location((-7.62, 16.51, 0), (0, 0, 270))):
            Circle(SKETCH4_R_2)
        with Locations(Location((7.62, 16.51, 0), (0, 0, 270))):
            Circle(SKETCH4_R_2)
        with Locations(Location((-16.51, -7.62, 0), (0, 0, 270))):
            Circle(SKETCH4_R_2)
        with Locations(Location((7.62, -16.51, 0), (0, 0, 90))):
            Circle(SKETCH4_R_2)
        with Locations(Location((-7.62, -16.51, 0), (0, 0, 90))):
            Circle(SKETCH4_R_2)
        with Locations(Location((16.51, -7.62, 0), (0, 0, 90))):
            Circle(SKETCH4_R_2)
        with Locations(Location((16.51, 7.62, 0), (0, 0, 90))):
            Circle(SKETCH4_R_2)
        with Locations(Location((5.578227154, 8.89, 0), (0, 0, 270))):
            Circle(SKETCH4_R_2)
        with Locations(Location((-5.578227154, 8.89, 0), (0, 0, 270))):
            Circle(SKETCH4_R_2)
        with Locations(Location((8.89, -5.578227154, 0), (0, 0, 270))):
            Circle(SKETCH4_R_2)
        with Locations(Location((8.89, 5.578227154, 0), (0, 0, 270))):
            Circle(SKETCH4_R_2)
        with Locations(Location((-5.578227154, -8.89, 0), (0, 0, 270))):
            Circle(SKETCH4_R_2)
        with Locations(Location((5.578227154, -8.89, 0), (0, 0, 270))):
            Circle(SKETCH4_R_2)
        with Locations(Location((-8.89, 5.578227154, 0), (0, 0, 270))):
            Circle(SKETCH4_R_2)
        with Locations(Location((-8.89, -5.578227154, 0), (0, 0, 270))):
            Circle(SKETCH4_R_2)
    extrude(amount=-CUT_EXTRUDE1_DEPTH, mode=Mode.SUBTRACT)


solid = part.part
